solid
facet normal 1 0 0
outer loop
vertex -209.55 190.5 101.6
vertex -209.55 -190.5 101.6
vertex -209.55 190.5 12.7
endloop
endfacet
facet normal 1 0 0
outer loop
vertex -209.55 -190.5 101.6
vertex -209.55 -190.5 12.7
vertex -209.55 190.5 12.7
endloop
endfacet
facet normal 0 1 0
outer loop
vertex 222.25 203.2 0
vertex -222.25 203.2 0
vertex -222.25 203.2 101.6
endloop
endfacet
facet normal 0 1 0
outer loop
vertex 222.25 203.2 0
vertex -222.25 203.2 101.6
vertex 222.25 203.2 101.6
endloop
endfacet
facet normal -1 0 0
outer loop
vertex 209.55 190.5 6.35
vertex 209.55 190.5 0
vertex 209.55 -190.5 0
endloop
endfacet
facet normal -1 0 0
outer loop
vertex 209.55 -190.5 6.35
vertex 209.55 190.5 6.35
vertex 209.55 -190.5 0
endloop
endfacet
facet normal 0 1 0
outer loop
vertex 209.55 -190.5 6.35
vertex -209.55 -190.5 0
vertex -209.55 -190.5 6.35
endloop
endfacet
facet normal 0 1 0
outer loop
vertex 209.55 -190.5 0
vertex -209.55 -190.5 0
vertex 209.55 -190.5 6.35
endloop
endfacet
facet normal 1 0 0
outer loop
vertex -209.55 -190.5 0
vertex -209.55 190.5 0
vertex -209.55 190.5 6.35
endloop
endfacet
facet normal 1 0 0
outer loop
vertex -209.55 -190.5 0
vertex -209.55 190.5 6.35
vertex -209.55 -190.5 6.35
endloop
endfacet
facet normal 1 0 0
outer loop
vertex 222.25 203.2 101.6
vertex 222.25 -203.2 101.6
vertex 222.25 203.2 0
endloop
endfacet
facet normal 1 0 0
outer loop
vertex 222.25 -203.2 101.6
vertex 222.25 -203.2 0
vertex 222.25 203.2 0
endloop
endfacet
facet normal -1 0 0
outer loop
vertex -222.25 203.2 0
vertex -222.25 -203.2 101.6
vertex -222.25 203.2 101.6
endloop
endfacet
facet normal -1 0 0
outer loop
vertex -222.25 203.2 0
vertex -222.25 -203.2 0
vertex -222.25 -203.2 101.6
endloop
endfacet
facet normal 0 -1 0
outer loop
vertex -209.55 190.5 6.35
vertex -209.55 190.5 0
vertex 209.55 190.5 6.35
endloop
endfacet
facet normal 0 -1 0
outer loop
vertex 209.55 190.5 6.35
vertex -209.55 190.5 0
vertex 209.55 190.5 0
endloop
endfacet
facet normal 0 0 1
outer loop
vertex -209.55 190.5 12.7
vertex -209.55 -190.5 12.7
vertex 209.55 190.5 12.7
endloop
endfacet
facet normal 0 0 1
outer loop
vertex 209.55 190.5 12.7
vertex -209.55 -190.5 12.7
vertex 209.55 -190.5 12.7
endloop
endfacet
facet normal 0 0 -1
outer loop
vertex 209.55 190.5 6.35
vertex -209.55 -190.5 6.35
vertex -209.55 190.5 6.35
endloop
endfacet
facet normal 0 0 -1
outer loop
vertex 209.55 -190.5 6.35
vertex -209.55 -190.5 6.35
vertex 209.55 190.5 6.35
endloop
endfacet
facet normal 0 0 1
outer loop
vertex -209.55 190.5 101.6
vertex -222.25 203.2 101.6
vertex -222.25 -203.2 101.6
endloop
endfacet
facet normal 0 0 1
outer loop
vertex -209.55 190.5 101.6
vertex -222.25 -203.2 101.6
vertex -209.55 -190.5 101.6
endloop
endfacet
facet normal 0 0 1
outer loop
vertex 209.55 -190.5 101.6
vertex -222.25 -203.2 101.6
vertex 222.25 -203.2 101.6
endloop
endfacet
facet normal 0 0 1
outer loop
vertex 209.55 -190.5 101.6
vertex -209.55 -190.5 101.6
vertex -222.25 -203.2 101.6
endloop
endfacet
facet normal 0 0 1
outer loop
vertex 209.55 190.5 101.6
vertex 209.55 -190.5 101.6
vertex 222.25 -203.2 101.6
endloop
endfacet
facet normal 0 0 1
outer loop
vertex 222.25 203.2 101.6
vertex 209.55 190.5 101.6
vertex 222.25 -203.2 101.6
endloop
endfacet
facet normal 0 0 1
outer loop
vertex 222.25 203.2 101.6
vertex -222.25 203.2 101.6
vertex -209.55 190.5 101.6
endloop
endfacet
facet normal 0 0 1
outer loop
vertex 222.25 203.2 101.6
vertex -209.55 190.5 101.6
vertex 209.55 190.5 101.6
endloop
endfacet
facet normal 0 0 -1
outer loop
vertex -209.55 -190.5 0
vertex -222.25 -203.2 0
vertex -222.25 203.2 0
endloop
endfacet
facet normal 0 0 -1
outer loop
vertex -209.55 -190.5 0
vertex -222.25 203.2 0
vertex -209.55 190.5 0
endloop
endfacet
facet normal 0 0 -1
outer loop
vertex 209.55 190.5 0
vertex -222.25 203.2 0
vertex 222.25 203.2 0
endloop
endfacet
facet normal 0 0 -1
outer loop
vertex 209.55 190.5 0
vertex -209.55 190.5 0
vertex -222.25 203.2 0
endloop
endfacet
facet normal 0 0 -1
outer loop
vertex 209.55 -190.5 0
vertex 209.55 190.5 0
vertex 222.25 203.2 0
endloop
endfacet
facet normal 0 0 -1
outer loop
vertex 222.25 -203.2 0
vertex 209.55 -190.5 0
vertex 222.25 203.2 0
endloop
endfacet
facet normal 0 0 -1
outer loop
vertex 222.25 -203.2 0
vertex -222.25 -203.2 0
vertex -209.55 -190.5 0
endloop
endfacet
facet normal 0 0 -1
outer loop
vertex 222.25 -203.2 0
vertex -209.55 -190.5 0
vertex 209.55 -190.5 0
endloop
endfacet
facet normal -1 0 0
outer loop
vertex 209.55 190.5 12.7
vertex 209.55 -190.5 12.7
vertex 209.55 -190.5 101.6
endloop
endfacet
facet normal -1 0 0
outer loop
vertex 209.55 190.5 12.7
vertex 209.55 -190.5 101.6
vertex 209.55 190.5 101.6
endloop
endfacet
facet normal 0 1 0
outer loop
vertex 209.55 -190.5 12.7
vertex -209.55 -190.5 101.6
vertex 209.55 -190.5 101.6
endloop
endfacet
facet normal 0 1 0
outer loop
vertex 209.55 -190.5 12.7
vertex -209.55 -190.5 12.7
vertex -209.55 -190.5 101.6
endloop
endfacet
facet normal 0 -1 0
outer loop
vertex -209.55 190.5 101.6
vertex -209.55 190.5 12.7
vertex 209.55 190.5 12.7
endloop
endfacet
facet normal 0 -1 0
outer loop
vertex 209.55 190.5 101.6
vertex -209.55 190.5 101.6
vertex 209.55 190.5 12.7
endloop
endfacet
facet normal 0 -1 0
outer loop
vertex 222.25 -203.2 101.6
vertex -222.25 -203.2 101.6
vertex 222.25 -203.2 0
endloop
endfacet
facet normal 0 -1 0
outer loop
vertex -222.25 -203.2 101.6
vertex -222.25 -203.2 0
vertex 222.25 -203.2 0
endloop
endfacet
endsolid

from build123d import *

# Parameters (mm, degrees)
F0_W     = 444.5
F0_H     = 406.4
F0_W_2   = 419.1
F0_H_2   = 381
F1_DEPTH = 63.5
F2_W     = 419.1
F2_H     = 381
F3_DEPTH = 12.7
F4_W     = 419.1
F4_H     = 381
F5_DEPTH = 6.35
F6_DEPTH = 38.1


with BuildPart() as f1:
    # F0 (on Top) → F1 (new body)
    with BuildSketch(Plane.XY):
        Rectangle(F0_W, F0_H)
        Rectangle(F0_W_2, F0_H_2, mode=Mode.SUBTRACT)
    extrude(amount=F1_DEPTH)

    # F2 (on face) → F3 (join)
    with BuildSketch(Plane(origin=(0, 0, 0), x_dir=(1, 0, 0), z_dir=(0, 0, -1))):
        Rectangle(F2_W, F2_H)
    extrude(amount=-F3_DEPTH)

    # F4 (on face) → F5 (cut)
    with BuildSketch(Plane(origin=(0, 0, 0), x_dir=(1, 0, 0), z_dir=(0, 0, -1))):
        Rectangle(F4_W, F4_H)
    extrude(amount=-F5_DEPTH, mode=Mode.SUBTRACT)

    # F6 (add): a face of the model
    f6_faces = [f1.faces().sort_by_distance(p)[0] for p in [
        (216.2271999037, 0, 63.5),
    ]]
    extrude(f6_faces, amount=F6_DEPTH)


solid = f1.part
